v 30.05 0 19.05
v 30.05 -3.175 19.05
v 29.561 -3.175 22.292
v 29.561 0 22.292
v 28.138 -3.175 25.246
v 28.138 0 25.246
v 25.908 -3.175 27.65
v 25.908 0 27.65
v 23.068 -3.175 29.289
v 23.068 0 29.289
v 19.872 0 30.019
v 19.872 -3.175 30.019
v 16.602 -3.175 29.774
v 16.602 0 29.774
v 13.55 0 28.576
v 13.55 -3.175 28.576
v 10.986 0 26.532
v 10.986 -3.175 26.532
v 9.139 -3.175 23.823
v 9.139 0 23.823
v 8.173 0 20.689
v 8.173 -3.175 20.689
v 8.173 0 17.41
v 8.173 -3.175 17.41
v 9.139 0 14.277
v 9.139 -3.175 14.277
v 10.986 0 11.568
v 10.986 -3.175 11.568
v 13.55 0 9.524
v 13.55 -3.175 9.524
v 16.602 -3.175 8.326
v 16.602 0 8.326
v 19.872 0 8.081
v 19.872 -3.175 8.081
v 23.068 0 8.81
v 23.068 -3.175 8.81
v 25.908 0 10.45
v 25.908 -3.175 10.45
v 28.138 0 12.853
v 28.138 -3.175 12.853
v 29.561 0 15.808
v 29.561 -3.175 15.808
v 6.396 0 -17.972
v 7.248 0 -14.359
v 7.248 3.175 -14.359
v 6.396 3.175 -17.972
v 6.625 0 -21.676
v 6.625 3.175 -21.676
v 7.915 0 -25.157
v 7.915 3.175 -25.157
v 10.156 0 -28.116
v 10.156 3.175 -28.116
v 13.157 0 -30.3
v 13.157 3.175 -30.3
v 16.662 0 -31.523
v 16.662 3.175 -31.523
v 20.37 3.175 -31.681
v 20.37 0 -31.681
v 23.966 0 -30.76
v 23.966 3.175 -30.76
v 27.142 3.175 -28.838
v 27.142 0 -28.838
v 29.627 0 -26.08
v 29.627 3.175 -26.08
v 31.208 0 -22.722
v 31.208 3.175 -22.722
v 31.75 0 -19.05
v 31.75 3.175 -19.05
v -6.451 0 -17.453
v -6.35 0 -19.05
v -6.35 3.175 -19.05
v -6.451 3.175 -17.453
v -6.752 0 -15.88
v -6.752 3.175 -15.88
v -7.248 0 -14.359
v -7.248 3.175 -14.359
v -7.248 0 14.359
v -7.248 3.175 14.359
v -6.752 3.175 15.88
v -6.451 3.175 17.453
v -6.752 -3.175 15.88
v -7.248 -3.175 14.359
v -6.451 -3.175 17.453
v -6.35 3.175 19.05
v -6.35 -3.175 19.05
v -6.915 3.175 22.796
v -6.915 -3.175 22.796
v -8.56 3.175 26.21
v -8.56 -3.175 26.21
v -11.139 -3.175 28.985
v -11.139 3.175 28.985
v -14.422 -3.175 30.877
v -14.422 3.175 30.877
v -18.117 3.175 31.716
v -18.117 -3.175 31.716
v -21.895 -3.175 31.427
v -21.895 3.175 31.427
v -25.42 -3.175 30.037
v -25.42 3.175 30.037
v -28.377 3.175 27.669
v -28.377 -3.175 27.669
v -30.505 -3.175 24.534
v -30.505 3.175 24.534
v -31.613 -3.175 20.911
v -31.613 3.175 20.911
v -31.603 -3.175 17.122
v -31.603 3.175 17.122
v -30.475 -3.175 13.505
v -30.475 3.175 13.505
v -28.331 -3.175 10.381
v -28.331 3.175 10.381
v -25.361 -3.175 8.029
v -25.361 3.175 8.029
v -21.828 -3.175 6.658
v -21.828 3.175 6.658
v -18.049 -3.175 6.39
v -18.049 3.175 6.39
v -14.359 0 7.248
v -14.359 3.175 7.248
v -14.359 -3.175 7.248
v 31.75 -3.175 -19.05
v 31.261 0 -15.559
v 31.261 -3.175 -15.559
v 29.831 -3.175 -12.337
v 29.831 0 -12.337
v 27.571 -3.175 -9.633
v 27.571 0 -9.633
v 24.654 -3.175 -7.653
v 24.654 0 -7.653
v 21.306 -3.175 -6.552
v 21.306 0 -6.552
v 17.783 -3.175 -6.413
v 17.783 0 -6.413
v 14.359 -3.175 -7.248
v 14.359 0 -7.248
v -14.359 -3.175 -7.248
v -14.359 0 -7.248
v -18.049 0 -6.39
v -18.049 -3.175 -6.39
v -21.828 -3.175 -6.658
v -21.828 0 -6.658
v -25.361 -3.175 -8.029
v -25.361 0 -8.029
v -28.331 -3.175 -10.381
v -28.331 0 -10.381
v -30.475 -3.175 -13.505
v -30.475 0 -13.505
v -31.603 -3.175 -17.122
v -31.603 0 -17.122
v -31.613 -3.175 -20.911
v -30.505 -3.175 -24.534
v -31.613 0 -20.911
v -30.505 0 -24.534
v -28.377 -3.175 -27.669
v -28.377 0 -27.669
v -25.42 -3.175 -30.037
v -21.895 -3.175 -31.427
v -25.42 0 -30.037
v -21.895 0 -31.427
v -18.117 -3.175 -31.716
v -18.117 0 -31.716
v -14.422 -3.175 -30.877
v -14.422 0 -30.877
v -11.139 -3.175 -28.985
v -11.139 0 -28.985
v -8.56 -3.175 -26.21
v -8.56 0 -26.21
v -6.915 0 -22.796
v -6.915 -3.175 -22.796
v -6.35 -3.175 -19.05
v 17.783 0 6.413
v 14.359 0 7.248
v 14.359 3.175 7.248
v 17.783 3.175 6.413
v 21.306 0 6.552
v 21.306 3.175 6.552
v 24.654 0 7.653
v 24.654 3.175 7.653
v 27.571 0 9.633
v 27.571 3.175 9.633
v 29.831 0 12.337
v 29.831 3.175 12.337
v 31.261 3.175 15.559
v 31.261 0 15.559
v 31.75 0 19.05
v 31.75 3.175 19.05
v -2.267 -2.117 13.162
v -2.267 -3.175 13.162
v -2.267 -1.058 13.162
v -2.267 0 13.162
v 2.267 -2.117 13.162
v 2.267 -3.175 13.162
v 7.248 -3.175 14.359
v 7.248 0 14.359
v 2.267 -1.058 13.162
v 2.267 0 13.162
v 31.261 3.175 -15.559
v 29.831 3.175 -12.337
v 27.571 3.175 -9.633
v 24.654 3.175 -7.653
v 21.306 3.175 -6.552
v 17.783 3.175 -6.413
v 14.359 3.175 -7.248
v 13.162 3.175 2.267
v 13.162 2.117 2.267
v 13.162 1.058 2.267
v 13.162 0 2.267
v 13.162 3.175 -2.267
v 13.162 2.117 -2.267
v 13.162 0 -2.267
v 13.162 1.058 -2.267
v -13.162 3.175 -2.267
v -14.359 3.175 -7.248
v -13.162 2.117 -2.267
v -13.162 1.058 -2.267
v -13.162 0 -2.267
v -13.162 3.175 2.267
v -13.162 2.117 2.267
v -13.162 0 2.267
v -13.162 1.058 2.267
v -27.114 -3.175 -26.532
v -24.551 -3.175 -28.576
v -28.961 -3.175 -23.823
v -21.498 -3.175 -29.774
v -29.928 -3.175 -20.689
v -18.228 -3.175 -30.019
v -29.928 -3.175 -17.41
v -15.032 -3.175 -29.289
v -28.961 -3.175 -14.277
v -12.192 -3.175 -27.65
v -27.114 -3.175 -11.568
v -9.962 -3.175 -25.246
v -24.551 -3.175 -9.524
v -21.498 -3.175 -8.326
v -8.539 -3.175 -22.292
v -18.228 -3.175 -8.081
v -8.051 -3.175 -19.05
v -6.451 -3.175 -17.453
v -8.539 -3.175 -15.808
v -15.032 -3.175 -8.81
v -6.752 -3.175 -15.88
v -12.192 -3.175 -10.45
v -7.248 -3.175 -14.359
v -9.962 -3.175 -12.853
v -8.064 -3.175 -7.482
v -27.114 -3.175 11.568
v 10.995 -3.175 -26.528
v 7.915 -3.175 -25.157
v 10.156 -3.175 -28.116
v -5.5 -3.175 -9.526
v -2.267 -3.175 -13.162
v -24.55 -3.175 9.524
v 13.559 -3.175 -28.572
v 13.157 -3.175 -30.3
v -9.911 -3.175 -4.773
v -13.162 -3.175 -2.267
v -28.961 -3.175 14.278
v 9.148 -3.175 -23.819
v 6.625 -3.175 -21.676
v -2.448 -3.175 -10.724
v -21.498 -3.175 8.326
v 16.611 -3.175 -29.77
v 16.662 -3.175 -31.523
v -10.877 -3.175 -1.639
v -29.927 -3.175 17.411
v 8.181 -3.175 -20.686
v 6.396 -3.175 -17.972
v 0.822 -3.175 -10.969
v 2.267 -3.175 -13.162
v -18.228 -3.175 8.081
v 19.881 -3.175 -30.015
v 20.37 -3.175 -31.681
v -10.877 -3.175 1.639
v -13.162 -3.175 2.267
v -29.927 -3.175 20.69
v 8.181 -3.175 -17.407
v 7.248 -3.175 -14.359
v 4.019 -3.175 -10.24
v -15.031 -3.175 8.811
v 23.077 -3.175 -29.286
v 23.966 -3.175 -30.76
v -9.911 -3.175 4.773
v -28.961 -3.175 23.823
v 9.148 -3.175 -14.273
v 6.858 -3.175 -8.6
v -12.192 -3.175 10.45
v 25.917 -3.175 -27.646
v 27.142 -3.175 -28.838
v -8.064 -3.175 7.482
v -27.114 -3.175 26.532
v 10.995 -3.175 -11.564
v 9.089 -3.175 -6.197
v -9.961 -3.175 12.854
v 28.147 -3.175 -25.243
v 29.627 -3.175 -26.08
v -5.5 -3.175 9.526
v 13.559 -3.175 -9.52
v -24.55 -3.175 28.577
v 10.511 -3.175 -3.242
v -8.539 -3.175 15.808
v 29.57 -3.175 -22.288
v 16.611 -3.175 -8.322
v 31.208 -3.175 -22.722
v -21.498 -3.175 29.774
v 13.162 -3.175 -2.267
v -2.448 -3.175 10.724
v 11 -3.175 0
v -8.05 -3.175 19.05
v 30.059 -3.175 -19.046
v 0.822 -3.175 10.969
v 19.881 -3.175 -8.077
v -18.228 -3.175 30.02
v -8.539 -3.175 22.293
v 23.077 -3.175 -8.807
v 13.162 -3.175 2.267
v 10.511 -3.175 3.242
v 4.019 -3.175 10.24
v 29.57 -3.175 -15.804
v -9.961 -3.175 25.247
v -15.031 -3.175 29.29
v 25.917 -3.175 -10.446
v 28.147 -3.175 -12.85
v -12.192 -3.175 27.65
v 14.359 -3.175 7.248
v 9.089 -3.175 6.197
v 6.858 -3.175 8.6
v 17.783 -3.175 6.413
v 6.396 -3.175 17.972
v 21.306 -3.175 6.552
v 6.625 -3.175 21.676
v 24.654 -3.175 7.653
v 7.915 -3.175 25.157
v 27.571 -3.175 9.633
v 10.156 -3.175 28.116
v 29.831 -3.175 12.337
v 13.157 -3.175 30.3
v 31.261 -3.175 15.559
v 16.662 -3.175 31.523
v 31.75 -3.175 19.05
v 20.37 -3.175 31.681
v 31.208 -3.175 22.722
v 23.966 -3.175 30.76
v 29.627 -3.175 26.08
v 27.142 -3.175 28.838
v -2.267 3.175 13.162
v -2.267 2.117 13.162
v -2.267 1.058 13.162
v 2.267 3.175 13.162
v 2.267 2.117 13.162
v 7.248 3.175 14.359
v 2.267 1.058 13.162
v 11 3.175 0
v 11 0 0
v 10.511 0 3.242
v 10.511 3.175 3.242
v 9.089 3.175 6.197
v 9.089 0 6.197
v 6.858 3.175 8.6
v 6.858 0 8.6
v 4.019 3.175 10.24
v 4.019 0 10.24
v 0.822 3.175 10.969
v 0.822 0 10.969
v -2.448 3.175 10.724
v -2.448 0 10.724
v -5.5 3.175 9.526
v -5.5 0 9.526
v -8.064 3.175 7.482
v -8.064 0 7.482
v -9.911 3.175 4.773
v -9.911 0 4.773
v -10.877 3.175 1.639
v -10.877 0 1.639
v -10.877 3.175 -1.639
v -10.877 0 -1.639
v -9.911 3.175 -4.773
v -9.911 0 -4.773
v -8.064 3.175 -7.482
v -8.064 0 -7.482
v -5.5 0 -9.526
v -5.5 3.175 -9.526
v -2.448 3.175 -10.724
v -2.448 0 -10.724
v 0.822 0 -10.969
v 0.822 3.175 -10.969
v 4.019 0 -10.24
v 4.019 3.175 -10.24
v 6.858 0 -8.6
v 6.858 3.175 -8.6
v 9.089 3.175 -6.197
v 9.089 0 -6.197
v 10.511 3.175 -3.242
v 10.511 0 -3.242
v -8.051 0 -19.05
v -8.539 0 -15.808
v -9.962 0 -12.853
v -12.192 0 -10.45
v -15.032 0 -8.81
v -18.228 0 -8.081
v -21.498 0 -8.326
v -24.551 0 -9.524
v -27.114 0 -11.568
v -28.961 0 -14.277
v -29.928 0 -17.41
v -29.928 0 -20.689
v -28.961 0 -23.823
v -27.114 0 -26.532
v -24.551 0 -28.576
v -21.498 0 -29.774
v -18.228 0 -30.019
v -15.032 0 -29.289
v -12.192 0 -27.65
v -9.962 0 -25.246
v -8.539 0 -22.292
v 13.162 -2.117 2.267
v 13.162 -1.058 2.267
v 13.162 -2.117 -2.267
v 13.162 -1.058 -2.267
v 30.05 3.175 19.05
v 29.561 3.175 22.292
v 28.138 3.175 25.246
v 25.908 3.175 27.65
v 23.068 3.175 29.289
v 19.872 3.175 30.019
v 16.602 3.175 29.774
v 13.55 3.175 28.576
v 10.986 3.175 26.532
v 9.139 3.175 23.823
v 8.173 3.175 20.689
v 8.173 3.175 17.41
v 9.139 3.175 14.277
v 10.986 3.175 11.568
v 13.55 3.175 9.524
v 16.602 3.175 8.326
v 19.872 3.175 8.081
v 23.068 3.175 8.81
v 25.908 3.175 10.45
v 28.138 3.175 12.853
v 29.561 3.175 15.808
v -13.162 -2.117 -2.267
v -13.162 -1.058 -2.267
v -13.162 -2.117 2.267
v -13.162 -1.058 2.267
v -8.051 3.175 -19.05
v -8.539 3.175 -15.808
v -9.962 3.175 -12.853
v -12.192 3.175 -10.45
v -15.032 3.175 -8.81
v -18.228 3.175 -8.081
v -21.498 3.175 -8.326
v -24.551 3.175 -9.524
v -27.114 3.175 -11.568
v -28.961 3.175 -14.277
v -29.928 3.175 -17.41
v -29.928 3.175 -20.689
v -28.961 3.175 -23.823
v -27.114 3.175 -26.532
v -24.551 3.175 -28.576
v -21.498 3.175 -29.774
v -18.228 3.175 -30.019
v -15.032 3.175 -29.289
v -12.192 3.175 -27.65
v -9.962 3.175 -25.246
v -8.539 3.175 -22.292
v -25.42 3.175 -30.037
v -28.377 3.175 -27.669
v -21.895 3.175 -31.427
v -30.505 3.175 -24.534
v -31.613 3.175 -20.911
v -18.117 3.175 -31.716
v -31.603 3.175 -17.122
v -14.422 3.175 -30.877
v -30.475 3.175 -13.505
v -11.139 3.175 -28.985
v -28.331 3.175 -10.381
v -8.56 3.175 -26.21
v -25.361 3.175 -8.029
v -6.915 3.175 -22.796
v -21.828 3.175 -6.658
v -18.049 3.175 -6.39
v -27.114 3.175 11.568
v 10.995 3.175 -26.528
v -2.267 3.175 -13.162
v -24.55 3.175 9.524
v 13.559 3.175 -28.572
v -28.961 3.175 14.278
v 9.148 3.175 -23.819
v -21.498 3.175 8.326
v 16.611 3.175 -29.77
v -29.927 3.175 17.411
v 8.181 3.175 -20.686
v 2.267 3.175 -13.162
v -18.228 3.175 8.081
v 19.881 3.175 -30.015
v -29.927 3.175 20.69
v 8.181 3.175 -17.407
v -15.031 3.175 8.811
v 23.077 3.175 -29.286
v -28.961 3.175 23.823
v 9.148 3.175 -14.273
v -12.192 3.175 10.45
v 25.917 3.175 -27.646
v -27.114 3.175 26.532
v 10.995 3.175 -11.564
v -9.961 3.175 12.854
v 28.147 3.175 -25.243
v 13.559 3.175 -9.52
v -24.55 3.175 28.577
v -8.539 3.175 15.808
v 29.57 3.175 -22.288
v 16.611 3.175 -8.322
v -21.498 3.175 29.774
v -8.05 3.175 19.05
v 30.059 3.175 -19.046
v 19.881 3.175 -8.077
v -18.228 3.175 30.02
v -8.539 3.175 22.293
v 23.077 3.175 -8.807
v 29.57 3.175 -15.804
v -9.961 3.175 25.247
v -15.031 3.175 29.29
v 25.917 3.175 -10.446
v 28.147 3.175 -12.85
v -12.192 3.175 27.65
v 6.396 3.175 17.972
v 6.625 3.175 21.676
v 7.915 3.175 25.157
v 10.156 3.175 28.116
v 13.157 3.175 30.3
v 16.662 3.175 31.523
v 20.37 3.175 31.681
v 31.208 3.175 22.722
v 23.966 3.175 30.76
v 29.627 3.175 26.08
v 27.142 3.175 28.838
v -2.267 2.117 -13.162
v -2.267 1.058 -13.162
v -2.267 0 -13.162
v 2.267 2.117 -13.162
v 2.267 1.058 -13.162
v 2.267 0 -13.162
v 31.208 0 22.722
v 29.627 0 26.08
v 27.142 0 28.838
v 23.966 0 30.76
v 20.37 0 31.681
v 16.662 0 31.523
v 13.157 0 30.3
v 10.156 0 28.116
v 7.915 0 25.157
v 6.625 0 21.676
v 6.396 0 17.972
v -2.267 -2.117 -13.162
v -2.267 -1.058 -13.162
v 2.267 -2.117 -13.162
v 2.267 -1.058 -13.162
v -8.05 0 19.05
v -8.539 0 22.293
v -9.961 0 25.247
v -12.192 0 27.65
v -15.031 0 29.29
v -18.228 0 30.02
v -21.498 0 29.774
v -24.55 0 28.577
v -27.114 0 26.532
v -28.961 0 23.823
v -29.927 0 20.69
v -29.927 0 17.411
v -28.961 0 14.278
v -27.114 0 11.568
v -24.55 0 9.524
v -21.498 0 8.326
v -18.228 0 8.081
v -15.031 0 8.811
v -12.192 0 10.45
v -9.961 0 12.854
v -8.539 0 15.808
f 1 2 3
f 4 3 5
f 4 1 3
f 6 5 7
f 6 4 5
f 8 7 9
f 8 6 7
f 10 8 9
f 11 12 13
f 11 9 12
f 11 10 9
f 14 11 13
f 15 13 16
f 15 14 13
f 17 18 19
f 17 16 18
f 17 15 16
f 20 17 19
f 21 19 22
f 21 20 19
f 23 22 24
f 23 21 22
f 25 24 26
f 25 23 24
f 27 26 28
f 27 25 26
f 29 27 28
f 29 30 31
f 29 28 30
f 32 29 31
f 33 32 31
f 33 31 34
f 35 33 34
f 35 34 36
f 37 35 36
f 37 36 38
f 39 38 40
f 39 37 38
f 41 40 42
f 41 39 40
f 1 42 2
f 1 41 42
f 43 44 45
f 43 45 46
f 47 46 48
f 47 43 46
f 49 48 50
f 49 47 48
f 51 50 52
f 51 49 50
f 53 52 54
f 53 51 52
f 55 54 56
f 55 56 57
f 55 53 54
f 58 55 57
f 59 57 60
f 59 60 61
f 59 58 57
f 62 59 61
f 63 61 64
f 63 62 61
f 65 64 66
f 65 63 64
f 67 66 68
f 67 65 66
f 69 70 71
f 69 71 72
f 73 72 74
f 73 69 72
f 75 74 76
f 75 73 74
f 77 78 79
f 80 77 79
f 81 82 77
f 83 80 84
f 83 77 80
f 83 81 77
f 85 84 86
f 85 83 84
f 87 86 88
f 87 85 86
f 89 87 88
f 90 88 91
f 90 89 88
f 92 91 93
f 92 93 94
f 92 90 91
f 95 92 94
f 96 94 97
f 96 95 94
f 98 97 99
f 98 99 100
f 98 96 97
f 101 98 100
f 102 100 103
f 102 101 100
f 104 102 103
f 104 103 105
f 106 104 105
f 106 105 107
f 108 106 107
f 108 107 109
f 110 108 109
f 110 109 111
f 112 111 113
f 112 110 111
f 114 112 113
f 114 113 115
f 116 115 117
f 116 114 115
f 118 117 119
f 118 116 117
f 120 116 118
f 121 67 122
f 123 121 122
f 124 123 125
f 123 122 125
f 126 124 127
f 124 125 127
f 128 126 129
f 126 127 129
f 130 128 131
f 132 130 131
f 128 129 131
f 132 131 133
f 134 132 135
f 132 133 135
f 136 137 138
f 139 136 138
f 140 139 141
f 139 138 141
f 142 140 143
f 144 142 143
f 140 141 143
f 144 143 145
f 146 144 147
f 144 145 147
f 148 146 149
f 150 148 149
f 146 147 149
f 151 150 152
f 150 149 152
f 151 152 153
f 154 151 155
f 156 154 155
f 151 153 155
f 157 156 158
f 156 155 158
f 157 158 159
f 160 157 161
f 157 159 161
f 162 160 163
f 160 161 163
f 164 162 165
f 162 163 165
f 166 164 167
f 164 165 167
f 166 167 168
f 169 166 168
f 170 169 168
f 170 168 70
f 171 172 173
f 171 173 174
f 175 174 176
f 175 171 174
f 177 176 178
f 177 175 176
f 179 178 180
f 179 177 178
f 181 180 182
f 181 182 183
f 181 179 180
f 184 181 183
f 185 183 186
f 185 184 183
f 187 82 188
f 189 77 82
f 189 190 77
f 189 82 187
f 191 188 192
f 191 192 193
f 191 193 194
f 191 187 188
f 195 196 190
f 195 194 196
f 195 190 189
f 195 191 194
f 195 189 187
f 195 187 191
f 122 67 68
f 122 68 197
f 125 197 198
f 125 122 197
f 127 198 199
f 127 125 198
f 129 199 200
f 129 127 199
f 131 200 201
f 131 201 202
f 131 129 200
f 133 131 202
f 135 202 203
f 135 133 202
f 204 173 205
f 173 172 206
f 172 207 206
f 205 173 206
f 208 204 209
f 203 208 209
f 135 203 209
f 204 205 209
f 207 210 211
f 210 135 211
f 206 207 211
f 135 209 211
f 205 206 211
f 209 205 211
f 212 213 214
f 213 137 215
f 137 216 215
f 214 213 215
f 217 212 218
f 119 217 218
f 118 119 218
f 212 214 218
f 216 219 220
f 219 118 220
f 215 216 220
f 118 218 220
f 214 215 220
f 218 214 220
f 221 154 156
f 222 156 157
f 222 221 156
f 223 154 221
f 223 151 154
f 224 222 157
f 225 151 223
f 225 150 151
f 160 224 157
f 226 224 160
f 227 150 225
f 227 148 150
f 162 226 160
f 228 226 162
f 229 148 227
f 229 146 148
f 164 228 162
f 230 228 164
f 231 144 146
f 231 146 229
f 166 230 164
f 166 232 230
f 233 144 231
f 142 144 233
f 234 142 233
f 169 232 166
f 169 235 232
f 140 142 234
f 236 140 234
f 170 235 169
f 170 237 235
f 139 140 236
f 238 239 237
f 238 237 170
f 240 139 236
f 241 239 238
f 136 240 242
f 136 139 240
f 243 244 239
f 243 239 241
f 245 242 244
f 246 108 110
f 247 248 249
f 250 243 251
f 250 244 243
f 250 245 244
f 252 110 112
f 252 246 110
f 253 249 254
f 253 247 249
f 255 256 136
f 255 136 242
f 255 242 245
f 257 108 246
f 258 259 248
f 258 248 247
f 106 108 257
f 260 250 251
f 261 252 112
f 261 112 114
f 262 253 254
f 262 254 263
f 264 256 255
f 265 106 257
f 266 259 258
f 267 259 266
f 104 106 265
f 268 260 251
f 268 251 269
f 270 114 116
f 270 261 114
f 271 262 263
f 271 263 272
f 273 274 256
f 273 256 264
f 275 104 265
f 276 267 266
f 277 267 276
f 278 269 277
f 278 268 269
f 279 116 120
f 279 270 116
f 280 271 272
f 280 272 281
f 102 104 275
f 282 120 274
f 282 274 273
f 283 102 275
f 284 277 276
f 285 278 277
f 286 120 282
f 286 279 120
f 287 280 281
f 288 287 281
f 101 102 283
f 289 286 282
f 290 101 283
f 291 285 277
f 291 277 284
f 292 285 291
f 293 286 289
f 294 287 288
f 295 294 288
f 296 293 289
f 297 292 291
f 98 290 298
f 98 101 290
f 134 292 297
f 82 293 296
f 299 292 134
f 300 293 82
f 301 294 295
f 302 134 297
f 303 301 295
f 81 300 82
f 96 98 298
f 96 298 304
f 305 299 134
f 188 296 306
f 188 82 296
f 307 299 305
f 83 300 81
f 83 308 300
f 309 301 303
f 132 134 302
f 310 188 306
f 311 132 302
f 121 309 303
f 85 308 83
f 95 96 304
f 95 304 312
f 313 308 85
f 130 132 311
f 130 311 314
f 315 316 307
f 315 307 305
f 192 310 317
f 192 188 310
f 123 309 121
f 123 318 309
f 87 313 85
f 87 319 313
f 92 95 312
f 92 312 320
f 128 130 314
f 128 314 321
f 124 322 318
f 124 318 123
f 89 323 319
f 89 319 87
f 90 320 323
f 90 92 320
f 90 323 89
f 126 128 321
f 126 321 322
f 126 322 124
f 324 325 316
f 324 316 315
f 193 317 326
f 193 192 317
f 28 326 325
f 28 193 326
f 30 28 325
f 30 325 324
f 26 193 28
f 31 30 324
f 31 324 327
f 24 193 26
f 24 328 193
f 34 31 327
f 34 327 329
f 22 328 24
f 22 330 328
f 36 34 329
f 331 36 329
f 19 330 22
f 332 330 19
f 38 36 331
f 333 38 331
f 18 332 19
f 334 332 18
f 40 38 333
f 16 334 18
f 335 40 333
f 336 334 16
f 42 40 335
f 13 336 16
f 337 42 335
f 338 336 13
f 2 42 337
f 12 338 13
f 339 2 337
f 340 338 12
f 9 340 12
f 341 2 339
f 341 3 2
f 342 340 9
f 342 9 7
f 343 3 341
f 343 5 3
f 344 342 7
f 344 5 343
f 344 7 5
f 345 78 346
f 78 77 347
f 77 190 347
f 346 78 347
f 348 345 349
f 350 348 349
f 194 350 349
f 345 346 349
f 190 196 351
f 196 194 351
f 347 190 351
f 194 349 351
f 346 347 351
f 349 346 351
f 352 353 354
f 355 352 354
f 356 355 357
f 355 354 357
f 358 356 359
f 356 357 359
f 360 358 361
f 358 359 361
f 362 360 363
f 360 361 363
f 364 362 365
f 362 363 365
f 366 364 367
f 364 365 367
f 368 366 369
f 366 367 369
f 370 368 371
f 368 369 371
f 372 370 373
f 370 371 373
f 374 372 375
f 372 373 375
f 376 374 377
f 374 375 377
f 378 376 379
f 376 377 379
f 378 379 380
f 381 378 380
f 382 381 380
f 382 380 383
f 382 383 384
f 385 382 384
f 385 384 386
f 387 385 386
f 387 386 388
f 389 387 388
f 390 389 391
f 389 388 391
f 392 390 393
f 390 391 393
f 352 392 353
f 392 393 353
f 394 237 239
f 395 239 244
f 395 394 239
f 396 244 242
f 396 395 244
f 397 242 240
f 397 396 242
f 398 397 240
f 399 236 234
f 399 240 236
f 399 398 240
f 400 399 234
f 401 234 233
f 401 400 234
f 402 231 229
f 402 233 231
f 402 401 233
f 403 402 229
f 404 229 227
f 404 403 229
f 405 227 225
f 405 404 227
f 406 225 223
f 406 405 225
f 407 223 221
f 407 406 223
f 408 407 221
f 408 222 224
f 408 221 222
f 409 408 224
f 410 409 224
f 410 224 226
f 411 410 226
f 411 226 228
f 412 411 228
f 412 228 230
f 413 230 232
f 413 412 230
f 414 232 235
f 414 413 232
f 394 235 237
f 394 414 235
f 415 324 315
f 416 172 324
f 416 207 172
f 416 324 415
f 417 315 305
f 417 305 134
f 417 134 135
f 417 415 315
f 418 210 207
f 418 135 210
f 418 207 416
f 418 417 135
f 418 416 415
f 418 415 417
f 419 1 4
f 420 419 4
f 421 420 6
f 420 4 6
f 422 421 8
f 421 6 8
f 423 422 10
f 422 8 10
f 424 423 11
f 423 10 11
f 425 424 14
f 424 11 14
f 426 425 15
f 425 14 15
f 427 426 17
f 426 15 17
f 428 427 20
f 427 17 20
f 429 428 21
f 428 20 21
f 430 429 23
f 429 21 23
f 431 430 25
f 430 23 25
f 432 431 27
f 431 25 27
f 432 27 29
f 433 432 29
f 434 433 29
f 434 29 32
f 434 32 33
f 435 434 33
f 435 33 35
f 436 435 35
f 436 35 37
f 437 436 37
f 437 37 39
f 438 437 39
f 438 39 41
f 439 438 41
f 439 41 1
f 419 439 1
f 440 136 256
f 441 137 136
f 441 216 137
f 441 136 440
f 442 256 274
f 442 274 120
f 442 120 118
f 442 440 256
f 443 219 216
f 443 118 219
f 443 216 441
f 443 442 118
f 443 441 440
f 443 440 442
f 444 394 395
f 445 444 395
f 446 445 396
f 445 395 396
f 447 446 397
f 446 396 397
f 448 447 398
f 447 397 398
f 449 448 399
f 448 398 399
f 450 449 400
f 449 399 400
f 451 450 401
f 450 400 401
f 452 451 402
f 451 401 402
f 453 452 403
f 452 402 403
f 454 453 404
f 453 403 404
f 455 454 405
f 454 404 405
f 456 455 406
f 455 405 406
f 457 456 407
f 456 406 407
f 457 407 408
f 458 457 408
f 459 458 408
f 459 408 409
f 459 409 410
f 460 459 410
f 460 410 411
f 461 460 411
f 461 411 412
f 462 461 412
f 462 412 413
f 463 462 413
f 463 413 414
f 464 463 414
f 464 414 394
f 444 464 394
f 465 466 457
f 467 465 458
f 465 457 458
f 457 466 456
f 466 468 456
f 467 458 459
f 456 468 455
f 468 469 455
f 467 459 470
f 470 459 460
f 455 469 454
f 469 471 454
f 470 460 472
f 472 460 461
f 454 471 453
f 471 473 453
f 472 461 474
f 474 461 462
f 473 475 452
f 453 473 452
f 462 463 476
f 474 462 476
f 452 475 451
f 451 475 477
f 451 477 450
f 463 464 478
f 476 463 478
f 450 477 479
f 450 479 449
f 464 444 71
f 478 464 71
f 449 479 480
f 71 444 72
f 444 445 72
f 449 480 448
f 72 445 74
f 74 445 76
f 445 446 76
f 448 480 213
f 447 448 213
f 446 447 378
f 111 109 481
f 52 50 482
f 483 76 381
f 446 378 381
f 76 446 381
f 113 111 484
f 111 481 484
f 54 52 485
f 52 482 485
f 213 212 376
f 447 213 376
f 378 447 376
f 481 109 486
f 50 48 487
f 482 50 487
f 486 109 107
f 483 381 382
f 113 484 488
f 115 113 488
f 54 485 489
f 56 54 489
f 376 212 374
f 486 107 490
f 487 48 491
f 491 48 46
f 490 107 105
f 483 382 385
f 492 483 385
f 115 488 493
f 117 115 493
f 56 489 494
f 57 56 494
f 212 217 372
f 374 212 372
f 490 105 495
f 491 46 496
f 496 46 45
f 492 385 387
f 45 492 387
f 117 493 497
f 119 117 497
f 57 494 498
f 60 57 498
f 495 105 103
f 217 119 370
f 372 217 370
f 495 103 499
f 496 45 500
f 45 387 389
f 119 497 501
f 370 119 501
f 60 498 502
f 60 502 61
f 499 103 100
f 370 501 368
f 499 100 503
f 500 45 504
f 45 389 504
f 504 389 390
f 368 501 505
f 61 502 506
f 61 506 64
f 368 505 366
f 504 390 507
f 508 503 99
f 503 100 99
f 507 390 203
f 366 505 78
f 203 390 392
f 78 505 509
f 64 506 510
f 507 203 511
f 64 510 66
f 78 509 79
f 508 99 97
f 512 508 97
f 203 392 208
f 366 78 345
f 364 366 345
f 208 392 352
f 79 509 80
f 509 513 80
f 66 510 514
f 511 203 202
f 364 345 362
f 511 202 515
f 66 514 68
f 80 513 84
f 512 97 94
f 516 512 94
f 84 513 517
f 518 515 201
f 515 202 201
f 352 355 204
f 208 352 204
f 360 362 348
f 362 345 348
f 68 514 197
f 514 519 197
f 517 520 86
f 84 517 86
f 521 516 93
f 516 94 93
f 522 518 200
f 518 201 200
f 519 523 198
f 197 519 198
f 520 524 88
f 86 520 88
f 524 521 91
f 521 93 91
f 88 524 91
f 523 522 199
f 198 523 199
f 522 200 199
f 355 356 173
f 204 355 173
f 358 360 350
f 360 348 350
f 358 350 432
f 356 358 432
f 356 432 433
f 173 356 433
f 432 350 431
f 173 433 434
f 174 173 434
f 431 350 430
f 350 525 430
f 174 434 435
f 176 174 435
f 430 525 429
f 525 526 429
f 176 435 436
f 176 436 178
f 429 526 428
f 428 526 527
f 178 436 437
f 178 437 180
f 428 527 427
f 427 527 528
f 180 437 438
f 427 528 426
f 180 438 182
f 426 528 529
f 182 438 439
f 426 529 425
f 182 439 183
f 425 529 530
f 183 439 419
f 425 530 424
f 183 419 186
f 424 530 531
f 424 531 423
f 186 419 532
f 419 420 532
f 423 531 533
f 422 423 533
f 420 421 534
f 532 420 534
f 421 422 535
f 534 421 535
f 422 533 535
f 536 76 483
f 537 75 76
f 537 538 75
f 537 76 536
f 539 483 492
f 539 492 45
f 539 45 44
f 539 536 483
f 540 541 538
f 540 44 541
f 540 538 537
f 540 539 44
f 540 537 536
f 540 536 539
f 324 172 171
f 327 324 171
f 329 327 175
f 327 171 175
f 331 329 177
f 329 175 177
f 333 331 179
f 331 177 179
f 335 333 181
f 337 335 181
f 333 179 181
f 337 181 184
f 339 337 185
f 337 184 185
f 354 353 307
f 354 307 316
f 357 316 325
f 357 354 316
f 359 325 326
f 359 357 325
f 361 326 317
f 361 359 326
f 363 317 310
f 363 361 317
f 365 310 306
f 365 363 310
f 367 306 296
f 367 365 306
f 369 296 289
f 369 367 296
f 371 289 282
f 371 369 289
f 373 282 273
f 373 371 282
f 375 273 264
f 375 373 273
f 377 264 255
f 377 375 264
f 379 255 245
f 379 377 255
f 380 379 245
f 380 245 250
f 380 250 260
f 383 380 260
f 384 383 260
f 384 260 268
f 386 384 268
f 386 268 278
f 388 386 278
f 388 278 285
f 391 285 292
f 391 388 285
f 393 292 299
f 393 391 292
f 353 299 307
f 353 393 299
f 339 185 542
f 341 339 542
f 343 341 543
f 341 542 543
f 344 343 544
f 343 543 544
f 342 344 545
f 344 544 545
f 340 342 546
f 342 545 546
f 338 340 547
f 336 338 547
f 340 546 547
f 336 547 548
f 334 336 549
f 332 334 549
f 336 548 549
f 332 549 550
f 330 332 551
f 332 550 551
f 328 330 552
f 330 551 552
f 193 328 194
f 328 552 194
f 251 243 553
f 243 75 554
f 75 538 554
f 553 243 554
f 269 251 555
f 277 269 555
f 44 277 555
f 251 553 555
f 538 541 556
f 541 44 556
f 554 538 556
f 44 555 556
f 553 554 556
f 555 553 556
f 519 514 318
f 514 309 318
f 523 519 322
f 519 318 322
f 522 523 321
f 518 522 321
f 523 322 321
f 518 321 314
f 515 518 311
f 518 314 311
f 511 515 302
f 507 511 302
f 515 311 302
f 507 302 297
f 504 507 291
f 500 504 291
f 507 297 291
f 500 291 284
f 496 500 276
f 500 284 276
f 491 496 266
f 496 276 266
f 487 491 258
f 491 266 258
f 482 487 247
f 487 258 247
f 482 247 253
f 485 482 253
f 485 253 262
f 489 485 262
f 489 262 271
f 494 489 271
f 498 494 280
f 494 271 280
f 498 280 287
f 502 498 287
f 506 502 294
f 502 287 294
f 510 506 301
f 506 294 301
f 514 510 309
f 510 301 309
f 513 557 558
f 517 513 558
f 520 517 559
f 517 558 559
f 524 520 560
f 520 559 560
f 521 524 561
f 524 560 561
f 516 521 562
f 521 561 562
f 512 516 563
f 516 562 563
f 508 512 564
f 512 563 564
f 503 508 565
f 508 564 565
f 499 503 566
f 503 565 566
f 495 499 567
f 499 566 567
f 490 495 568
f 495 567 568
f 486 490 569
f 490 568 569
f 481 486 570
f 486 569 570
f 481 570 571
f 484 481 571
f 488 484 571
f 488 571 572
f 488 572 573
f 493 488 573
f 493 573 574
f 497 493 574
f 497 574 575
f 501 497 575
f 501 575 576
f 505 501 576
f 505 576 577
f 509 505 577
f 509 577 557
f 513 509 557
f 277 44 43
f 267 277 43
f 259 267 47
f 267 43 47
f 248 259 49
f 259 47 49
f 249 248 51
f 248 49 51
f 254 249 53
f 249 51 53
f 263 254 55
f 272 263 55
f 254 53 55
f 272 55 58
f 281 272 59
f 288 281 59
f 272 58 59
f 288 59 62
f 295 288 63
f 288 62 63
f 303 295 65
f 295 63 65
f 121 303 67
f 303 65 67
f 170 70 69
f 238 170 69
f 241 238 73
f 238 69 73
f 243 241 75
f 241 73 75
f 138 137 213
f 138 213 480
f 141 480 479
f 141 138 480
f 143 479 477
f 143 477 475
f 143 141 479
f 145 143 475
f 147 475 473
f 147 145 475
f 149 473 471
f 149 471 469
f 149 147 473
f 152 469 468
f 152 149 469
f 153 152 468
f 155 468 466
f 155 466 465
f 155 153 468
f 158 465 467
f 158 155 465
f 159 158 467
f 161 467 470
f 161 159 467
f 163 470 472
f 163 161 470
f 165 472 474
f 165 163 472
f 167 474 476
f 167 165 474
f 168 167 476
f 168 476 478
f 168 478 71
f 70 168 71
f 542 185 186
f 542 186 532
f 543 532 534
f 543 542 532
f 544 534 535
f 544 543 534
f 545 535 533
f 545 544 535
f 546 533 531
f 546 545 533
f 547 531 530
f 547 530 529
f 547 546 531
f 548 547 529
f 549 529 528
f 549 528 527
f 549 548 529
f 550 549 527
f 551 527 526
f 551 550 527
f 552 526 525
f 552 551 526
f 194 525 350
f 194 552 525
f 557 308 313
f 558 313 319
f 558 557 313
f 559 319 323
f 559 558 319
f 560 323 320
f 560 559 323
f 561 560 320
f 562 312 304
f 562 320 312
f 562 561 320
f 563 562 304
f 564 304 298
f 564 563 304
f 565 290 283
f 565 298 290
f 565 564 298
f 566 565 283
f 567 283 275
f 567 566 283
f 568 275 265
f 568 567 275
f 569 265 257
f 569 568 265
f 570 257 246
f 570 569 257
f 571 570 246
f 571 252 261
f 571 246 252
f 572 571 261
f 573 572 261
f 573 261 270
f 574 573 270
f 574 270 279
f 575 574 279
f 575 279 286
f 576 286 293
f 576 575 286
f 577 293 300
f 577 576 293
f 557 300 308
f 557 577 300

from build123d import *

# Parameters (mm, degrees)
F0_R     = 11
F2_DEPTH = 3.175
F1_R     = 11
F3_DEPTH = 12.7


with BuildPart() as f2:
    # F0 (on Front) → F2 (new body, symmetric)
    with BuildSketch(Plane.XZ):
        with BuildLine():
            ThreePointArc((-7.2482056801, 14.3587687297), (-6.5765724866, 16.6617776341), (-6.35, 19.05))
            ThreePointArc((-6.35, 19.05), (-29.5587734092, 26.1813169495), (-14.3587687297, 7.2482056801))
            add(Edge.make_bspline(
                [(-14.3587687297, 7.2482056801), (-15.3619108037, 10.3222858149), (-16.9256545604, 14.0228222828), (-19.05, 19.05)],
                knots=[28.0456445655, 28.0456445655, 28.0456445655, 28.0456445655, 38.1, 38.1, 38.1, 38.1], degree=3))
            add(Edge.make_bspline(
                [(-19.05, 19.05), (-14.0228222828, 16.9256545604), (-10.3222858149, 15.3619108037), (-7.2482056801, 14.3587687297)],
                knots=[0, 0, 0, 0, 10.0543554345, 10.0543554345, 10.0543554345, 10.0543554345], degree=3))
        make_face()
        with BuildLine():
            add(Edge.make_bspline(
                [(-14.3587687297, 7.2482056801), (-15.3619108037, 10.3222858149), (-16.9256545604, 14.0228222828), (-19.05, 19.05)],
                knots=[28.0456445655, 28.0456445655, 28.0456445655, 28.0456445655, 38.1, 38.1, 38.1, 38.1], degree=3))
            ThreePointArc((-14.3587687297, 7.2482056801), (-10.0697438789, 10.0697438789), (-7.2482056801, 14.3587687297))
            add(Edge.make_bspline(
                [(-19.05, 19.05), (-14.0228222828, 16.9256545604), (-10.3222858149, 15.3619108037), (-7.2482056801, 14.3587687297)],
                knots=[0, 0, 0, 0, 10.0543554345, 10.0543554345, 10.0543554345, 10.0543554345], degree=3))
        make_face()
        with BuildLine():
            ThreePointArc((-7.2482056801, 14.3587687297), (-10.0697438789, 10.0697438789), (-14.3587687297, 7.2482056801))
            add(Edge.make_bspline(
                [(-14.3587687297, -7.2482056801), (-12.5637437568, -1.7474388854), (-12.5637437568, 1.7474388854), (-14.3587687297, 7.2482056801)],
                knots=[10.0543554345, 10.0543554345, 10.0543554345, 10.0543554345, 28.0456445655, 28.0456445655, 28.0456445655, 28.0456445655], degree=3))
            ThreePointArc((-14.3587687297, -7.2482056801), (-10.0697438789, -10.0697438789), (-7.2482056801, -14.3587687297))
            add(Edge.make_bspline(
                [(-7.2482056801, -14.3587687297), (-1.7474388854, -12.5637437568), (1.7474388854, -12.5637437568), (7.2482056801, -14.3587687297)],
                knots=[10.0543554345, 10.0543554345, 10.0543554345, 10.0543554345, 28.0456445655, 28.0456445655, 28.0456445655, 28.0456445655], degree=3))
            ThreePointArc((7.2482056801, -14.3587687297), (10.0697438789, -10.0697438789), (14.3587687297, -7.2482056801))
            add(Edge.make_bspline(
                [(14.3587687297, 7.2482056801), (12.5637437568, 1.7474388854), (12.5637437568, -1.7474388854), (14.3587687297, -7.2482056801)],
                knots=[10.0543554345, 10.0543554345, 10.0543554345, 10.0543554345, 28.0456445655, 28.0456445655, 28.0456445655, 28.0456445655], degree=3))
            ThreePointArc((14.3587687297, 7.2482056801), (10.0697438789, 10.0697438789), (7.2482056801, 14.3587687297))
            add(Edge.make_bspline(
                [(-7.2482056801, 14.3587687297), (-1.7474388854, 12.5637437568), (1.7474388854, 12.5637437568), (7.2482056801, 14.3587687297)],
                knots=[10.0543554345, 10.0543554345, 10.0543554345, 10.0543554345, 28.0456445655, 28.0456445655, 28.0456445655, 28.0456445655], degree=3))
        make_face()
        Circle(F0_R, mode=Mode.SUBTRACT)
        with BuildLine():
            add(Edge.make_bspline(
                [(-19.05, -19.05), (-16.9256545604, -14.0228222828), (-15.3619108037, -10.3222858149), (-14.3587687297, -7.2482056801)],
                knots=[0, 0, 0, 0, 10.0543554345, 10.0543554345, 10.0543554345, 10.0543554345], degree=3))
            ThreePointArc((-14.3587687297, -7.2482056801), (-29.5587734092, -26.1813169495), (-6.35, -19.05))
            ThreePointArc((-6.35, -19.05), (-6.5765724866, -16.6617776341), (-7.2482056801, -14.3587687297))
            add(Edge.make_bspline(
                [(-19.05, -19.05), (-14.0228222828, -16.9256545604), (-10.3222858149, -15.3619108037), (-7.2482056801, -14.3587687297)],
                knots=[0, 0, 0, 0, 10.0543554345, 10.0543554345, 10.0543554345, 10.0543554345], degree=3))
        make_face()
        with BuildLine():
            ThreePointArc((-7.2482056801, -14.3587687297), (-10.0697438789, -10.0697438789), (-14.3587687297, -7.2482056801))
            add(Edge.make_bspline(
                [(-19.05, -19.05), (-16.9256545604, -14.0228222828), (-15.3619108037, -10.3222858149), (-14.3587687297, -7.2482056801)],
                knots=[0, 0, 0, 0, 10.0543554345, 10.0543554345, 10.0543554345, 10.0543554345], degree=3))
            add(Edge.make_bspline(
                [(-19.05, -19.05), (-14.0228222828, -16.9256545604), (-10.3222858149, -15.3619108037), (-7.2482056801, -14.3587687297)],
                knots=[0, 0, 0, 0, 10.0543554345, 10.0543554345, 10.0543554345, 10.0543554345], degree=3))
        make_face()
        with BuildLine():
            add(Edge.make_bspline(
                [(7.2482056801, 14.3587687297), (10.3222858149, 15.3619108037), (14.0228222828, 16.9256545604), (19.05, 19.05)],
                knots=[28.0456445655, 28.0456445655, 28.0456445655, 28.0456445655, 38.1, 38.1, 38.1, 38.1], degree=3))
            ThreePointArc((7.2482056801, 14.3587687297), (10.0697438789, 10.0697438789), (14.3587687297, 7.2482056801))
            add(Edge.make_bspline(
                [(19.05, 19.05), (16.9256545604, 14.0228222828), (15.3619108037, 10.3222858149), (14.3587687297, 7.2482056801)],
                knots=[0, 0, 0, 0, 10.0543554345, 10.0543554345, 10.0543554345, 10.0543554345], degree=3))
        make_face()
        with BuildLine():
            ThreePointArc((31.75, 19.05), (16.6617776341, 31.5234275134), (7.2482056801, 14.3587687297))
            add(Edge.make_bspline(
                [(7.2482056801, 14.3587687297), (10.3222858149, 15.3619108037), (14.0228222828, 16.9256545604), (19.05, 19.05)],
                knots=[28.0456445655, 28.0456445655, 28.0456445655, 28.0456445655, 38.1, 38.1, 38.1, 38.1], degree=3))
            add(Edge.make_bspline(
                [(19.05, 19.05), (16.9256545604, 14.0228222828), (15.3619108037, 10.3222858149), (14.3587687297, 7.2482056801)],
                knots=[0, 0, 0, 0, 10.0543554345, 10.0543554345, 10.0543554345, 10.0543554345], degree=3))
            ThreePointArc((14.3587687297, 7.2482056801), (26.1813169495, 8.5412265908), (31.75, 19.05))
        make_face()
        with BuildLine():
            add(Edge.make_bspline(
                [(7.2482056801, -14.3587687297), (10.3222858149, -15.3619108037), (14.0228222828, -16.9256545604), (19.05, -19.05)],
                knots=[28.0456445655, 28.0456445655, 28.0456445655, 28.0456445655, 38.1, 38.1, 38.1, 38.1], degree=3))
            ThreePointArc((7.2482056801, -14.3587687297), (16.6617776341, -31.5234275134), (31.75, -19.05))
            ThreePointArc((31.75, -19.05), (26.1813169495, -8.5412265908), (14.3587687297, -7.2482056801))
            add(Edge.make_bspline(
                [(14.3587687297, -7.2482056801), (15.3619108037, -10.3222858149), (16.9256545604, -14.0228222828), (19.05, -19.05)],
                knots=[28.0456445655, 28.0456445655, 28.0456445655, 28.0456445655, 38.1, 38.1, 38.1, 38.1], degree=3))
        make_face()
        with BuildLine():
            ThreePointArc((14.3587687297, -7.2482056801), (10.0697438789, -10.0697438789), (7.2482056801, -14.3587687297))
            add(Edge.make_bspline(
                [(7.2482056801, -14.3587687297), (10.3222858149, -15.3619108037), (14.0228222828, -16.9256545604), (19.05, -19.05)],
                knots=[28.0456445655, 28.0456445655, 28.0456445655, 28.0456445655, 38.1, 38.1, 38.1, 38.1], degree=3))
            add(Edge.make_bspline(
                [(14.3587687297, -7.2482056801), (15.3619108037, -10.3222858149), (16.9256545604, -14.0228222828), (19.05, -19.05)],
                knots=[28.0456445655, 28.0456445655, 28.0456445655, 28.0456445655, 38.1, 38.1, 38.1, 38.1], degree=3))
        make_face()
    extrude(amount=F2_DEPTH, both=True)

    # F1 (on Front) → F3 (cut, symmetric)
    with BuildSketch(Plane.XZ):
        with Locations((-19.0500058234, 19.0502889454)):
            Circle(F1_R)
        with Locations((19.0496798605, 19.0498717129)):
            Circle(F1_R)
        with Locations((-19.0505106002, -19.0498437732)):
            Circle(F1_R)
        with Locations((19.0585404634, -19.0461371094)):
            Circle(F1_R)
    extrude(amount=F3_DEPTH, both=True, mode=Mode.SUBTRACT)


solid = f2.part
